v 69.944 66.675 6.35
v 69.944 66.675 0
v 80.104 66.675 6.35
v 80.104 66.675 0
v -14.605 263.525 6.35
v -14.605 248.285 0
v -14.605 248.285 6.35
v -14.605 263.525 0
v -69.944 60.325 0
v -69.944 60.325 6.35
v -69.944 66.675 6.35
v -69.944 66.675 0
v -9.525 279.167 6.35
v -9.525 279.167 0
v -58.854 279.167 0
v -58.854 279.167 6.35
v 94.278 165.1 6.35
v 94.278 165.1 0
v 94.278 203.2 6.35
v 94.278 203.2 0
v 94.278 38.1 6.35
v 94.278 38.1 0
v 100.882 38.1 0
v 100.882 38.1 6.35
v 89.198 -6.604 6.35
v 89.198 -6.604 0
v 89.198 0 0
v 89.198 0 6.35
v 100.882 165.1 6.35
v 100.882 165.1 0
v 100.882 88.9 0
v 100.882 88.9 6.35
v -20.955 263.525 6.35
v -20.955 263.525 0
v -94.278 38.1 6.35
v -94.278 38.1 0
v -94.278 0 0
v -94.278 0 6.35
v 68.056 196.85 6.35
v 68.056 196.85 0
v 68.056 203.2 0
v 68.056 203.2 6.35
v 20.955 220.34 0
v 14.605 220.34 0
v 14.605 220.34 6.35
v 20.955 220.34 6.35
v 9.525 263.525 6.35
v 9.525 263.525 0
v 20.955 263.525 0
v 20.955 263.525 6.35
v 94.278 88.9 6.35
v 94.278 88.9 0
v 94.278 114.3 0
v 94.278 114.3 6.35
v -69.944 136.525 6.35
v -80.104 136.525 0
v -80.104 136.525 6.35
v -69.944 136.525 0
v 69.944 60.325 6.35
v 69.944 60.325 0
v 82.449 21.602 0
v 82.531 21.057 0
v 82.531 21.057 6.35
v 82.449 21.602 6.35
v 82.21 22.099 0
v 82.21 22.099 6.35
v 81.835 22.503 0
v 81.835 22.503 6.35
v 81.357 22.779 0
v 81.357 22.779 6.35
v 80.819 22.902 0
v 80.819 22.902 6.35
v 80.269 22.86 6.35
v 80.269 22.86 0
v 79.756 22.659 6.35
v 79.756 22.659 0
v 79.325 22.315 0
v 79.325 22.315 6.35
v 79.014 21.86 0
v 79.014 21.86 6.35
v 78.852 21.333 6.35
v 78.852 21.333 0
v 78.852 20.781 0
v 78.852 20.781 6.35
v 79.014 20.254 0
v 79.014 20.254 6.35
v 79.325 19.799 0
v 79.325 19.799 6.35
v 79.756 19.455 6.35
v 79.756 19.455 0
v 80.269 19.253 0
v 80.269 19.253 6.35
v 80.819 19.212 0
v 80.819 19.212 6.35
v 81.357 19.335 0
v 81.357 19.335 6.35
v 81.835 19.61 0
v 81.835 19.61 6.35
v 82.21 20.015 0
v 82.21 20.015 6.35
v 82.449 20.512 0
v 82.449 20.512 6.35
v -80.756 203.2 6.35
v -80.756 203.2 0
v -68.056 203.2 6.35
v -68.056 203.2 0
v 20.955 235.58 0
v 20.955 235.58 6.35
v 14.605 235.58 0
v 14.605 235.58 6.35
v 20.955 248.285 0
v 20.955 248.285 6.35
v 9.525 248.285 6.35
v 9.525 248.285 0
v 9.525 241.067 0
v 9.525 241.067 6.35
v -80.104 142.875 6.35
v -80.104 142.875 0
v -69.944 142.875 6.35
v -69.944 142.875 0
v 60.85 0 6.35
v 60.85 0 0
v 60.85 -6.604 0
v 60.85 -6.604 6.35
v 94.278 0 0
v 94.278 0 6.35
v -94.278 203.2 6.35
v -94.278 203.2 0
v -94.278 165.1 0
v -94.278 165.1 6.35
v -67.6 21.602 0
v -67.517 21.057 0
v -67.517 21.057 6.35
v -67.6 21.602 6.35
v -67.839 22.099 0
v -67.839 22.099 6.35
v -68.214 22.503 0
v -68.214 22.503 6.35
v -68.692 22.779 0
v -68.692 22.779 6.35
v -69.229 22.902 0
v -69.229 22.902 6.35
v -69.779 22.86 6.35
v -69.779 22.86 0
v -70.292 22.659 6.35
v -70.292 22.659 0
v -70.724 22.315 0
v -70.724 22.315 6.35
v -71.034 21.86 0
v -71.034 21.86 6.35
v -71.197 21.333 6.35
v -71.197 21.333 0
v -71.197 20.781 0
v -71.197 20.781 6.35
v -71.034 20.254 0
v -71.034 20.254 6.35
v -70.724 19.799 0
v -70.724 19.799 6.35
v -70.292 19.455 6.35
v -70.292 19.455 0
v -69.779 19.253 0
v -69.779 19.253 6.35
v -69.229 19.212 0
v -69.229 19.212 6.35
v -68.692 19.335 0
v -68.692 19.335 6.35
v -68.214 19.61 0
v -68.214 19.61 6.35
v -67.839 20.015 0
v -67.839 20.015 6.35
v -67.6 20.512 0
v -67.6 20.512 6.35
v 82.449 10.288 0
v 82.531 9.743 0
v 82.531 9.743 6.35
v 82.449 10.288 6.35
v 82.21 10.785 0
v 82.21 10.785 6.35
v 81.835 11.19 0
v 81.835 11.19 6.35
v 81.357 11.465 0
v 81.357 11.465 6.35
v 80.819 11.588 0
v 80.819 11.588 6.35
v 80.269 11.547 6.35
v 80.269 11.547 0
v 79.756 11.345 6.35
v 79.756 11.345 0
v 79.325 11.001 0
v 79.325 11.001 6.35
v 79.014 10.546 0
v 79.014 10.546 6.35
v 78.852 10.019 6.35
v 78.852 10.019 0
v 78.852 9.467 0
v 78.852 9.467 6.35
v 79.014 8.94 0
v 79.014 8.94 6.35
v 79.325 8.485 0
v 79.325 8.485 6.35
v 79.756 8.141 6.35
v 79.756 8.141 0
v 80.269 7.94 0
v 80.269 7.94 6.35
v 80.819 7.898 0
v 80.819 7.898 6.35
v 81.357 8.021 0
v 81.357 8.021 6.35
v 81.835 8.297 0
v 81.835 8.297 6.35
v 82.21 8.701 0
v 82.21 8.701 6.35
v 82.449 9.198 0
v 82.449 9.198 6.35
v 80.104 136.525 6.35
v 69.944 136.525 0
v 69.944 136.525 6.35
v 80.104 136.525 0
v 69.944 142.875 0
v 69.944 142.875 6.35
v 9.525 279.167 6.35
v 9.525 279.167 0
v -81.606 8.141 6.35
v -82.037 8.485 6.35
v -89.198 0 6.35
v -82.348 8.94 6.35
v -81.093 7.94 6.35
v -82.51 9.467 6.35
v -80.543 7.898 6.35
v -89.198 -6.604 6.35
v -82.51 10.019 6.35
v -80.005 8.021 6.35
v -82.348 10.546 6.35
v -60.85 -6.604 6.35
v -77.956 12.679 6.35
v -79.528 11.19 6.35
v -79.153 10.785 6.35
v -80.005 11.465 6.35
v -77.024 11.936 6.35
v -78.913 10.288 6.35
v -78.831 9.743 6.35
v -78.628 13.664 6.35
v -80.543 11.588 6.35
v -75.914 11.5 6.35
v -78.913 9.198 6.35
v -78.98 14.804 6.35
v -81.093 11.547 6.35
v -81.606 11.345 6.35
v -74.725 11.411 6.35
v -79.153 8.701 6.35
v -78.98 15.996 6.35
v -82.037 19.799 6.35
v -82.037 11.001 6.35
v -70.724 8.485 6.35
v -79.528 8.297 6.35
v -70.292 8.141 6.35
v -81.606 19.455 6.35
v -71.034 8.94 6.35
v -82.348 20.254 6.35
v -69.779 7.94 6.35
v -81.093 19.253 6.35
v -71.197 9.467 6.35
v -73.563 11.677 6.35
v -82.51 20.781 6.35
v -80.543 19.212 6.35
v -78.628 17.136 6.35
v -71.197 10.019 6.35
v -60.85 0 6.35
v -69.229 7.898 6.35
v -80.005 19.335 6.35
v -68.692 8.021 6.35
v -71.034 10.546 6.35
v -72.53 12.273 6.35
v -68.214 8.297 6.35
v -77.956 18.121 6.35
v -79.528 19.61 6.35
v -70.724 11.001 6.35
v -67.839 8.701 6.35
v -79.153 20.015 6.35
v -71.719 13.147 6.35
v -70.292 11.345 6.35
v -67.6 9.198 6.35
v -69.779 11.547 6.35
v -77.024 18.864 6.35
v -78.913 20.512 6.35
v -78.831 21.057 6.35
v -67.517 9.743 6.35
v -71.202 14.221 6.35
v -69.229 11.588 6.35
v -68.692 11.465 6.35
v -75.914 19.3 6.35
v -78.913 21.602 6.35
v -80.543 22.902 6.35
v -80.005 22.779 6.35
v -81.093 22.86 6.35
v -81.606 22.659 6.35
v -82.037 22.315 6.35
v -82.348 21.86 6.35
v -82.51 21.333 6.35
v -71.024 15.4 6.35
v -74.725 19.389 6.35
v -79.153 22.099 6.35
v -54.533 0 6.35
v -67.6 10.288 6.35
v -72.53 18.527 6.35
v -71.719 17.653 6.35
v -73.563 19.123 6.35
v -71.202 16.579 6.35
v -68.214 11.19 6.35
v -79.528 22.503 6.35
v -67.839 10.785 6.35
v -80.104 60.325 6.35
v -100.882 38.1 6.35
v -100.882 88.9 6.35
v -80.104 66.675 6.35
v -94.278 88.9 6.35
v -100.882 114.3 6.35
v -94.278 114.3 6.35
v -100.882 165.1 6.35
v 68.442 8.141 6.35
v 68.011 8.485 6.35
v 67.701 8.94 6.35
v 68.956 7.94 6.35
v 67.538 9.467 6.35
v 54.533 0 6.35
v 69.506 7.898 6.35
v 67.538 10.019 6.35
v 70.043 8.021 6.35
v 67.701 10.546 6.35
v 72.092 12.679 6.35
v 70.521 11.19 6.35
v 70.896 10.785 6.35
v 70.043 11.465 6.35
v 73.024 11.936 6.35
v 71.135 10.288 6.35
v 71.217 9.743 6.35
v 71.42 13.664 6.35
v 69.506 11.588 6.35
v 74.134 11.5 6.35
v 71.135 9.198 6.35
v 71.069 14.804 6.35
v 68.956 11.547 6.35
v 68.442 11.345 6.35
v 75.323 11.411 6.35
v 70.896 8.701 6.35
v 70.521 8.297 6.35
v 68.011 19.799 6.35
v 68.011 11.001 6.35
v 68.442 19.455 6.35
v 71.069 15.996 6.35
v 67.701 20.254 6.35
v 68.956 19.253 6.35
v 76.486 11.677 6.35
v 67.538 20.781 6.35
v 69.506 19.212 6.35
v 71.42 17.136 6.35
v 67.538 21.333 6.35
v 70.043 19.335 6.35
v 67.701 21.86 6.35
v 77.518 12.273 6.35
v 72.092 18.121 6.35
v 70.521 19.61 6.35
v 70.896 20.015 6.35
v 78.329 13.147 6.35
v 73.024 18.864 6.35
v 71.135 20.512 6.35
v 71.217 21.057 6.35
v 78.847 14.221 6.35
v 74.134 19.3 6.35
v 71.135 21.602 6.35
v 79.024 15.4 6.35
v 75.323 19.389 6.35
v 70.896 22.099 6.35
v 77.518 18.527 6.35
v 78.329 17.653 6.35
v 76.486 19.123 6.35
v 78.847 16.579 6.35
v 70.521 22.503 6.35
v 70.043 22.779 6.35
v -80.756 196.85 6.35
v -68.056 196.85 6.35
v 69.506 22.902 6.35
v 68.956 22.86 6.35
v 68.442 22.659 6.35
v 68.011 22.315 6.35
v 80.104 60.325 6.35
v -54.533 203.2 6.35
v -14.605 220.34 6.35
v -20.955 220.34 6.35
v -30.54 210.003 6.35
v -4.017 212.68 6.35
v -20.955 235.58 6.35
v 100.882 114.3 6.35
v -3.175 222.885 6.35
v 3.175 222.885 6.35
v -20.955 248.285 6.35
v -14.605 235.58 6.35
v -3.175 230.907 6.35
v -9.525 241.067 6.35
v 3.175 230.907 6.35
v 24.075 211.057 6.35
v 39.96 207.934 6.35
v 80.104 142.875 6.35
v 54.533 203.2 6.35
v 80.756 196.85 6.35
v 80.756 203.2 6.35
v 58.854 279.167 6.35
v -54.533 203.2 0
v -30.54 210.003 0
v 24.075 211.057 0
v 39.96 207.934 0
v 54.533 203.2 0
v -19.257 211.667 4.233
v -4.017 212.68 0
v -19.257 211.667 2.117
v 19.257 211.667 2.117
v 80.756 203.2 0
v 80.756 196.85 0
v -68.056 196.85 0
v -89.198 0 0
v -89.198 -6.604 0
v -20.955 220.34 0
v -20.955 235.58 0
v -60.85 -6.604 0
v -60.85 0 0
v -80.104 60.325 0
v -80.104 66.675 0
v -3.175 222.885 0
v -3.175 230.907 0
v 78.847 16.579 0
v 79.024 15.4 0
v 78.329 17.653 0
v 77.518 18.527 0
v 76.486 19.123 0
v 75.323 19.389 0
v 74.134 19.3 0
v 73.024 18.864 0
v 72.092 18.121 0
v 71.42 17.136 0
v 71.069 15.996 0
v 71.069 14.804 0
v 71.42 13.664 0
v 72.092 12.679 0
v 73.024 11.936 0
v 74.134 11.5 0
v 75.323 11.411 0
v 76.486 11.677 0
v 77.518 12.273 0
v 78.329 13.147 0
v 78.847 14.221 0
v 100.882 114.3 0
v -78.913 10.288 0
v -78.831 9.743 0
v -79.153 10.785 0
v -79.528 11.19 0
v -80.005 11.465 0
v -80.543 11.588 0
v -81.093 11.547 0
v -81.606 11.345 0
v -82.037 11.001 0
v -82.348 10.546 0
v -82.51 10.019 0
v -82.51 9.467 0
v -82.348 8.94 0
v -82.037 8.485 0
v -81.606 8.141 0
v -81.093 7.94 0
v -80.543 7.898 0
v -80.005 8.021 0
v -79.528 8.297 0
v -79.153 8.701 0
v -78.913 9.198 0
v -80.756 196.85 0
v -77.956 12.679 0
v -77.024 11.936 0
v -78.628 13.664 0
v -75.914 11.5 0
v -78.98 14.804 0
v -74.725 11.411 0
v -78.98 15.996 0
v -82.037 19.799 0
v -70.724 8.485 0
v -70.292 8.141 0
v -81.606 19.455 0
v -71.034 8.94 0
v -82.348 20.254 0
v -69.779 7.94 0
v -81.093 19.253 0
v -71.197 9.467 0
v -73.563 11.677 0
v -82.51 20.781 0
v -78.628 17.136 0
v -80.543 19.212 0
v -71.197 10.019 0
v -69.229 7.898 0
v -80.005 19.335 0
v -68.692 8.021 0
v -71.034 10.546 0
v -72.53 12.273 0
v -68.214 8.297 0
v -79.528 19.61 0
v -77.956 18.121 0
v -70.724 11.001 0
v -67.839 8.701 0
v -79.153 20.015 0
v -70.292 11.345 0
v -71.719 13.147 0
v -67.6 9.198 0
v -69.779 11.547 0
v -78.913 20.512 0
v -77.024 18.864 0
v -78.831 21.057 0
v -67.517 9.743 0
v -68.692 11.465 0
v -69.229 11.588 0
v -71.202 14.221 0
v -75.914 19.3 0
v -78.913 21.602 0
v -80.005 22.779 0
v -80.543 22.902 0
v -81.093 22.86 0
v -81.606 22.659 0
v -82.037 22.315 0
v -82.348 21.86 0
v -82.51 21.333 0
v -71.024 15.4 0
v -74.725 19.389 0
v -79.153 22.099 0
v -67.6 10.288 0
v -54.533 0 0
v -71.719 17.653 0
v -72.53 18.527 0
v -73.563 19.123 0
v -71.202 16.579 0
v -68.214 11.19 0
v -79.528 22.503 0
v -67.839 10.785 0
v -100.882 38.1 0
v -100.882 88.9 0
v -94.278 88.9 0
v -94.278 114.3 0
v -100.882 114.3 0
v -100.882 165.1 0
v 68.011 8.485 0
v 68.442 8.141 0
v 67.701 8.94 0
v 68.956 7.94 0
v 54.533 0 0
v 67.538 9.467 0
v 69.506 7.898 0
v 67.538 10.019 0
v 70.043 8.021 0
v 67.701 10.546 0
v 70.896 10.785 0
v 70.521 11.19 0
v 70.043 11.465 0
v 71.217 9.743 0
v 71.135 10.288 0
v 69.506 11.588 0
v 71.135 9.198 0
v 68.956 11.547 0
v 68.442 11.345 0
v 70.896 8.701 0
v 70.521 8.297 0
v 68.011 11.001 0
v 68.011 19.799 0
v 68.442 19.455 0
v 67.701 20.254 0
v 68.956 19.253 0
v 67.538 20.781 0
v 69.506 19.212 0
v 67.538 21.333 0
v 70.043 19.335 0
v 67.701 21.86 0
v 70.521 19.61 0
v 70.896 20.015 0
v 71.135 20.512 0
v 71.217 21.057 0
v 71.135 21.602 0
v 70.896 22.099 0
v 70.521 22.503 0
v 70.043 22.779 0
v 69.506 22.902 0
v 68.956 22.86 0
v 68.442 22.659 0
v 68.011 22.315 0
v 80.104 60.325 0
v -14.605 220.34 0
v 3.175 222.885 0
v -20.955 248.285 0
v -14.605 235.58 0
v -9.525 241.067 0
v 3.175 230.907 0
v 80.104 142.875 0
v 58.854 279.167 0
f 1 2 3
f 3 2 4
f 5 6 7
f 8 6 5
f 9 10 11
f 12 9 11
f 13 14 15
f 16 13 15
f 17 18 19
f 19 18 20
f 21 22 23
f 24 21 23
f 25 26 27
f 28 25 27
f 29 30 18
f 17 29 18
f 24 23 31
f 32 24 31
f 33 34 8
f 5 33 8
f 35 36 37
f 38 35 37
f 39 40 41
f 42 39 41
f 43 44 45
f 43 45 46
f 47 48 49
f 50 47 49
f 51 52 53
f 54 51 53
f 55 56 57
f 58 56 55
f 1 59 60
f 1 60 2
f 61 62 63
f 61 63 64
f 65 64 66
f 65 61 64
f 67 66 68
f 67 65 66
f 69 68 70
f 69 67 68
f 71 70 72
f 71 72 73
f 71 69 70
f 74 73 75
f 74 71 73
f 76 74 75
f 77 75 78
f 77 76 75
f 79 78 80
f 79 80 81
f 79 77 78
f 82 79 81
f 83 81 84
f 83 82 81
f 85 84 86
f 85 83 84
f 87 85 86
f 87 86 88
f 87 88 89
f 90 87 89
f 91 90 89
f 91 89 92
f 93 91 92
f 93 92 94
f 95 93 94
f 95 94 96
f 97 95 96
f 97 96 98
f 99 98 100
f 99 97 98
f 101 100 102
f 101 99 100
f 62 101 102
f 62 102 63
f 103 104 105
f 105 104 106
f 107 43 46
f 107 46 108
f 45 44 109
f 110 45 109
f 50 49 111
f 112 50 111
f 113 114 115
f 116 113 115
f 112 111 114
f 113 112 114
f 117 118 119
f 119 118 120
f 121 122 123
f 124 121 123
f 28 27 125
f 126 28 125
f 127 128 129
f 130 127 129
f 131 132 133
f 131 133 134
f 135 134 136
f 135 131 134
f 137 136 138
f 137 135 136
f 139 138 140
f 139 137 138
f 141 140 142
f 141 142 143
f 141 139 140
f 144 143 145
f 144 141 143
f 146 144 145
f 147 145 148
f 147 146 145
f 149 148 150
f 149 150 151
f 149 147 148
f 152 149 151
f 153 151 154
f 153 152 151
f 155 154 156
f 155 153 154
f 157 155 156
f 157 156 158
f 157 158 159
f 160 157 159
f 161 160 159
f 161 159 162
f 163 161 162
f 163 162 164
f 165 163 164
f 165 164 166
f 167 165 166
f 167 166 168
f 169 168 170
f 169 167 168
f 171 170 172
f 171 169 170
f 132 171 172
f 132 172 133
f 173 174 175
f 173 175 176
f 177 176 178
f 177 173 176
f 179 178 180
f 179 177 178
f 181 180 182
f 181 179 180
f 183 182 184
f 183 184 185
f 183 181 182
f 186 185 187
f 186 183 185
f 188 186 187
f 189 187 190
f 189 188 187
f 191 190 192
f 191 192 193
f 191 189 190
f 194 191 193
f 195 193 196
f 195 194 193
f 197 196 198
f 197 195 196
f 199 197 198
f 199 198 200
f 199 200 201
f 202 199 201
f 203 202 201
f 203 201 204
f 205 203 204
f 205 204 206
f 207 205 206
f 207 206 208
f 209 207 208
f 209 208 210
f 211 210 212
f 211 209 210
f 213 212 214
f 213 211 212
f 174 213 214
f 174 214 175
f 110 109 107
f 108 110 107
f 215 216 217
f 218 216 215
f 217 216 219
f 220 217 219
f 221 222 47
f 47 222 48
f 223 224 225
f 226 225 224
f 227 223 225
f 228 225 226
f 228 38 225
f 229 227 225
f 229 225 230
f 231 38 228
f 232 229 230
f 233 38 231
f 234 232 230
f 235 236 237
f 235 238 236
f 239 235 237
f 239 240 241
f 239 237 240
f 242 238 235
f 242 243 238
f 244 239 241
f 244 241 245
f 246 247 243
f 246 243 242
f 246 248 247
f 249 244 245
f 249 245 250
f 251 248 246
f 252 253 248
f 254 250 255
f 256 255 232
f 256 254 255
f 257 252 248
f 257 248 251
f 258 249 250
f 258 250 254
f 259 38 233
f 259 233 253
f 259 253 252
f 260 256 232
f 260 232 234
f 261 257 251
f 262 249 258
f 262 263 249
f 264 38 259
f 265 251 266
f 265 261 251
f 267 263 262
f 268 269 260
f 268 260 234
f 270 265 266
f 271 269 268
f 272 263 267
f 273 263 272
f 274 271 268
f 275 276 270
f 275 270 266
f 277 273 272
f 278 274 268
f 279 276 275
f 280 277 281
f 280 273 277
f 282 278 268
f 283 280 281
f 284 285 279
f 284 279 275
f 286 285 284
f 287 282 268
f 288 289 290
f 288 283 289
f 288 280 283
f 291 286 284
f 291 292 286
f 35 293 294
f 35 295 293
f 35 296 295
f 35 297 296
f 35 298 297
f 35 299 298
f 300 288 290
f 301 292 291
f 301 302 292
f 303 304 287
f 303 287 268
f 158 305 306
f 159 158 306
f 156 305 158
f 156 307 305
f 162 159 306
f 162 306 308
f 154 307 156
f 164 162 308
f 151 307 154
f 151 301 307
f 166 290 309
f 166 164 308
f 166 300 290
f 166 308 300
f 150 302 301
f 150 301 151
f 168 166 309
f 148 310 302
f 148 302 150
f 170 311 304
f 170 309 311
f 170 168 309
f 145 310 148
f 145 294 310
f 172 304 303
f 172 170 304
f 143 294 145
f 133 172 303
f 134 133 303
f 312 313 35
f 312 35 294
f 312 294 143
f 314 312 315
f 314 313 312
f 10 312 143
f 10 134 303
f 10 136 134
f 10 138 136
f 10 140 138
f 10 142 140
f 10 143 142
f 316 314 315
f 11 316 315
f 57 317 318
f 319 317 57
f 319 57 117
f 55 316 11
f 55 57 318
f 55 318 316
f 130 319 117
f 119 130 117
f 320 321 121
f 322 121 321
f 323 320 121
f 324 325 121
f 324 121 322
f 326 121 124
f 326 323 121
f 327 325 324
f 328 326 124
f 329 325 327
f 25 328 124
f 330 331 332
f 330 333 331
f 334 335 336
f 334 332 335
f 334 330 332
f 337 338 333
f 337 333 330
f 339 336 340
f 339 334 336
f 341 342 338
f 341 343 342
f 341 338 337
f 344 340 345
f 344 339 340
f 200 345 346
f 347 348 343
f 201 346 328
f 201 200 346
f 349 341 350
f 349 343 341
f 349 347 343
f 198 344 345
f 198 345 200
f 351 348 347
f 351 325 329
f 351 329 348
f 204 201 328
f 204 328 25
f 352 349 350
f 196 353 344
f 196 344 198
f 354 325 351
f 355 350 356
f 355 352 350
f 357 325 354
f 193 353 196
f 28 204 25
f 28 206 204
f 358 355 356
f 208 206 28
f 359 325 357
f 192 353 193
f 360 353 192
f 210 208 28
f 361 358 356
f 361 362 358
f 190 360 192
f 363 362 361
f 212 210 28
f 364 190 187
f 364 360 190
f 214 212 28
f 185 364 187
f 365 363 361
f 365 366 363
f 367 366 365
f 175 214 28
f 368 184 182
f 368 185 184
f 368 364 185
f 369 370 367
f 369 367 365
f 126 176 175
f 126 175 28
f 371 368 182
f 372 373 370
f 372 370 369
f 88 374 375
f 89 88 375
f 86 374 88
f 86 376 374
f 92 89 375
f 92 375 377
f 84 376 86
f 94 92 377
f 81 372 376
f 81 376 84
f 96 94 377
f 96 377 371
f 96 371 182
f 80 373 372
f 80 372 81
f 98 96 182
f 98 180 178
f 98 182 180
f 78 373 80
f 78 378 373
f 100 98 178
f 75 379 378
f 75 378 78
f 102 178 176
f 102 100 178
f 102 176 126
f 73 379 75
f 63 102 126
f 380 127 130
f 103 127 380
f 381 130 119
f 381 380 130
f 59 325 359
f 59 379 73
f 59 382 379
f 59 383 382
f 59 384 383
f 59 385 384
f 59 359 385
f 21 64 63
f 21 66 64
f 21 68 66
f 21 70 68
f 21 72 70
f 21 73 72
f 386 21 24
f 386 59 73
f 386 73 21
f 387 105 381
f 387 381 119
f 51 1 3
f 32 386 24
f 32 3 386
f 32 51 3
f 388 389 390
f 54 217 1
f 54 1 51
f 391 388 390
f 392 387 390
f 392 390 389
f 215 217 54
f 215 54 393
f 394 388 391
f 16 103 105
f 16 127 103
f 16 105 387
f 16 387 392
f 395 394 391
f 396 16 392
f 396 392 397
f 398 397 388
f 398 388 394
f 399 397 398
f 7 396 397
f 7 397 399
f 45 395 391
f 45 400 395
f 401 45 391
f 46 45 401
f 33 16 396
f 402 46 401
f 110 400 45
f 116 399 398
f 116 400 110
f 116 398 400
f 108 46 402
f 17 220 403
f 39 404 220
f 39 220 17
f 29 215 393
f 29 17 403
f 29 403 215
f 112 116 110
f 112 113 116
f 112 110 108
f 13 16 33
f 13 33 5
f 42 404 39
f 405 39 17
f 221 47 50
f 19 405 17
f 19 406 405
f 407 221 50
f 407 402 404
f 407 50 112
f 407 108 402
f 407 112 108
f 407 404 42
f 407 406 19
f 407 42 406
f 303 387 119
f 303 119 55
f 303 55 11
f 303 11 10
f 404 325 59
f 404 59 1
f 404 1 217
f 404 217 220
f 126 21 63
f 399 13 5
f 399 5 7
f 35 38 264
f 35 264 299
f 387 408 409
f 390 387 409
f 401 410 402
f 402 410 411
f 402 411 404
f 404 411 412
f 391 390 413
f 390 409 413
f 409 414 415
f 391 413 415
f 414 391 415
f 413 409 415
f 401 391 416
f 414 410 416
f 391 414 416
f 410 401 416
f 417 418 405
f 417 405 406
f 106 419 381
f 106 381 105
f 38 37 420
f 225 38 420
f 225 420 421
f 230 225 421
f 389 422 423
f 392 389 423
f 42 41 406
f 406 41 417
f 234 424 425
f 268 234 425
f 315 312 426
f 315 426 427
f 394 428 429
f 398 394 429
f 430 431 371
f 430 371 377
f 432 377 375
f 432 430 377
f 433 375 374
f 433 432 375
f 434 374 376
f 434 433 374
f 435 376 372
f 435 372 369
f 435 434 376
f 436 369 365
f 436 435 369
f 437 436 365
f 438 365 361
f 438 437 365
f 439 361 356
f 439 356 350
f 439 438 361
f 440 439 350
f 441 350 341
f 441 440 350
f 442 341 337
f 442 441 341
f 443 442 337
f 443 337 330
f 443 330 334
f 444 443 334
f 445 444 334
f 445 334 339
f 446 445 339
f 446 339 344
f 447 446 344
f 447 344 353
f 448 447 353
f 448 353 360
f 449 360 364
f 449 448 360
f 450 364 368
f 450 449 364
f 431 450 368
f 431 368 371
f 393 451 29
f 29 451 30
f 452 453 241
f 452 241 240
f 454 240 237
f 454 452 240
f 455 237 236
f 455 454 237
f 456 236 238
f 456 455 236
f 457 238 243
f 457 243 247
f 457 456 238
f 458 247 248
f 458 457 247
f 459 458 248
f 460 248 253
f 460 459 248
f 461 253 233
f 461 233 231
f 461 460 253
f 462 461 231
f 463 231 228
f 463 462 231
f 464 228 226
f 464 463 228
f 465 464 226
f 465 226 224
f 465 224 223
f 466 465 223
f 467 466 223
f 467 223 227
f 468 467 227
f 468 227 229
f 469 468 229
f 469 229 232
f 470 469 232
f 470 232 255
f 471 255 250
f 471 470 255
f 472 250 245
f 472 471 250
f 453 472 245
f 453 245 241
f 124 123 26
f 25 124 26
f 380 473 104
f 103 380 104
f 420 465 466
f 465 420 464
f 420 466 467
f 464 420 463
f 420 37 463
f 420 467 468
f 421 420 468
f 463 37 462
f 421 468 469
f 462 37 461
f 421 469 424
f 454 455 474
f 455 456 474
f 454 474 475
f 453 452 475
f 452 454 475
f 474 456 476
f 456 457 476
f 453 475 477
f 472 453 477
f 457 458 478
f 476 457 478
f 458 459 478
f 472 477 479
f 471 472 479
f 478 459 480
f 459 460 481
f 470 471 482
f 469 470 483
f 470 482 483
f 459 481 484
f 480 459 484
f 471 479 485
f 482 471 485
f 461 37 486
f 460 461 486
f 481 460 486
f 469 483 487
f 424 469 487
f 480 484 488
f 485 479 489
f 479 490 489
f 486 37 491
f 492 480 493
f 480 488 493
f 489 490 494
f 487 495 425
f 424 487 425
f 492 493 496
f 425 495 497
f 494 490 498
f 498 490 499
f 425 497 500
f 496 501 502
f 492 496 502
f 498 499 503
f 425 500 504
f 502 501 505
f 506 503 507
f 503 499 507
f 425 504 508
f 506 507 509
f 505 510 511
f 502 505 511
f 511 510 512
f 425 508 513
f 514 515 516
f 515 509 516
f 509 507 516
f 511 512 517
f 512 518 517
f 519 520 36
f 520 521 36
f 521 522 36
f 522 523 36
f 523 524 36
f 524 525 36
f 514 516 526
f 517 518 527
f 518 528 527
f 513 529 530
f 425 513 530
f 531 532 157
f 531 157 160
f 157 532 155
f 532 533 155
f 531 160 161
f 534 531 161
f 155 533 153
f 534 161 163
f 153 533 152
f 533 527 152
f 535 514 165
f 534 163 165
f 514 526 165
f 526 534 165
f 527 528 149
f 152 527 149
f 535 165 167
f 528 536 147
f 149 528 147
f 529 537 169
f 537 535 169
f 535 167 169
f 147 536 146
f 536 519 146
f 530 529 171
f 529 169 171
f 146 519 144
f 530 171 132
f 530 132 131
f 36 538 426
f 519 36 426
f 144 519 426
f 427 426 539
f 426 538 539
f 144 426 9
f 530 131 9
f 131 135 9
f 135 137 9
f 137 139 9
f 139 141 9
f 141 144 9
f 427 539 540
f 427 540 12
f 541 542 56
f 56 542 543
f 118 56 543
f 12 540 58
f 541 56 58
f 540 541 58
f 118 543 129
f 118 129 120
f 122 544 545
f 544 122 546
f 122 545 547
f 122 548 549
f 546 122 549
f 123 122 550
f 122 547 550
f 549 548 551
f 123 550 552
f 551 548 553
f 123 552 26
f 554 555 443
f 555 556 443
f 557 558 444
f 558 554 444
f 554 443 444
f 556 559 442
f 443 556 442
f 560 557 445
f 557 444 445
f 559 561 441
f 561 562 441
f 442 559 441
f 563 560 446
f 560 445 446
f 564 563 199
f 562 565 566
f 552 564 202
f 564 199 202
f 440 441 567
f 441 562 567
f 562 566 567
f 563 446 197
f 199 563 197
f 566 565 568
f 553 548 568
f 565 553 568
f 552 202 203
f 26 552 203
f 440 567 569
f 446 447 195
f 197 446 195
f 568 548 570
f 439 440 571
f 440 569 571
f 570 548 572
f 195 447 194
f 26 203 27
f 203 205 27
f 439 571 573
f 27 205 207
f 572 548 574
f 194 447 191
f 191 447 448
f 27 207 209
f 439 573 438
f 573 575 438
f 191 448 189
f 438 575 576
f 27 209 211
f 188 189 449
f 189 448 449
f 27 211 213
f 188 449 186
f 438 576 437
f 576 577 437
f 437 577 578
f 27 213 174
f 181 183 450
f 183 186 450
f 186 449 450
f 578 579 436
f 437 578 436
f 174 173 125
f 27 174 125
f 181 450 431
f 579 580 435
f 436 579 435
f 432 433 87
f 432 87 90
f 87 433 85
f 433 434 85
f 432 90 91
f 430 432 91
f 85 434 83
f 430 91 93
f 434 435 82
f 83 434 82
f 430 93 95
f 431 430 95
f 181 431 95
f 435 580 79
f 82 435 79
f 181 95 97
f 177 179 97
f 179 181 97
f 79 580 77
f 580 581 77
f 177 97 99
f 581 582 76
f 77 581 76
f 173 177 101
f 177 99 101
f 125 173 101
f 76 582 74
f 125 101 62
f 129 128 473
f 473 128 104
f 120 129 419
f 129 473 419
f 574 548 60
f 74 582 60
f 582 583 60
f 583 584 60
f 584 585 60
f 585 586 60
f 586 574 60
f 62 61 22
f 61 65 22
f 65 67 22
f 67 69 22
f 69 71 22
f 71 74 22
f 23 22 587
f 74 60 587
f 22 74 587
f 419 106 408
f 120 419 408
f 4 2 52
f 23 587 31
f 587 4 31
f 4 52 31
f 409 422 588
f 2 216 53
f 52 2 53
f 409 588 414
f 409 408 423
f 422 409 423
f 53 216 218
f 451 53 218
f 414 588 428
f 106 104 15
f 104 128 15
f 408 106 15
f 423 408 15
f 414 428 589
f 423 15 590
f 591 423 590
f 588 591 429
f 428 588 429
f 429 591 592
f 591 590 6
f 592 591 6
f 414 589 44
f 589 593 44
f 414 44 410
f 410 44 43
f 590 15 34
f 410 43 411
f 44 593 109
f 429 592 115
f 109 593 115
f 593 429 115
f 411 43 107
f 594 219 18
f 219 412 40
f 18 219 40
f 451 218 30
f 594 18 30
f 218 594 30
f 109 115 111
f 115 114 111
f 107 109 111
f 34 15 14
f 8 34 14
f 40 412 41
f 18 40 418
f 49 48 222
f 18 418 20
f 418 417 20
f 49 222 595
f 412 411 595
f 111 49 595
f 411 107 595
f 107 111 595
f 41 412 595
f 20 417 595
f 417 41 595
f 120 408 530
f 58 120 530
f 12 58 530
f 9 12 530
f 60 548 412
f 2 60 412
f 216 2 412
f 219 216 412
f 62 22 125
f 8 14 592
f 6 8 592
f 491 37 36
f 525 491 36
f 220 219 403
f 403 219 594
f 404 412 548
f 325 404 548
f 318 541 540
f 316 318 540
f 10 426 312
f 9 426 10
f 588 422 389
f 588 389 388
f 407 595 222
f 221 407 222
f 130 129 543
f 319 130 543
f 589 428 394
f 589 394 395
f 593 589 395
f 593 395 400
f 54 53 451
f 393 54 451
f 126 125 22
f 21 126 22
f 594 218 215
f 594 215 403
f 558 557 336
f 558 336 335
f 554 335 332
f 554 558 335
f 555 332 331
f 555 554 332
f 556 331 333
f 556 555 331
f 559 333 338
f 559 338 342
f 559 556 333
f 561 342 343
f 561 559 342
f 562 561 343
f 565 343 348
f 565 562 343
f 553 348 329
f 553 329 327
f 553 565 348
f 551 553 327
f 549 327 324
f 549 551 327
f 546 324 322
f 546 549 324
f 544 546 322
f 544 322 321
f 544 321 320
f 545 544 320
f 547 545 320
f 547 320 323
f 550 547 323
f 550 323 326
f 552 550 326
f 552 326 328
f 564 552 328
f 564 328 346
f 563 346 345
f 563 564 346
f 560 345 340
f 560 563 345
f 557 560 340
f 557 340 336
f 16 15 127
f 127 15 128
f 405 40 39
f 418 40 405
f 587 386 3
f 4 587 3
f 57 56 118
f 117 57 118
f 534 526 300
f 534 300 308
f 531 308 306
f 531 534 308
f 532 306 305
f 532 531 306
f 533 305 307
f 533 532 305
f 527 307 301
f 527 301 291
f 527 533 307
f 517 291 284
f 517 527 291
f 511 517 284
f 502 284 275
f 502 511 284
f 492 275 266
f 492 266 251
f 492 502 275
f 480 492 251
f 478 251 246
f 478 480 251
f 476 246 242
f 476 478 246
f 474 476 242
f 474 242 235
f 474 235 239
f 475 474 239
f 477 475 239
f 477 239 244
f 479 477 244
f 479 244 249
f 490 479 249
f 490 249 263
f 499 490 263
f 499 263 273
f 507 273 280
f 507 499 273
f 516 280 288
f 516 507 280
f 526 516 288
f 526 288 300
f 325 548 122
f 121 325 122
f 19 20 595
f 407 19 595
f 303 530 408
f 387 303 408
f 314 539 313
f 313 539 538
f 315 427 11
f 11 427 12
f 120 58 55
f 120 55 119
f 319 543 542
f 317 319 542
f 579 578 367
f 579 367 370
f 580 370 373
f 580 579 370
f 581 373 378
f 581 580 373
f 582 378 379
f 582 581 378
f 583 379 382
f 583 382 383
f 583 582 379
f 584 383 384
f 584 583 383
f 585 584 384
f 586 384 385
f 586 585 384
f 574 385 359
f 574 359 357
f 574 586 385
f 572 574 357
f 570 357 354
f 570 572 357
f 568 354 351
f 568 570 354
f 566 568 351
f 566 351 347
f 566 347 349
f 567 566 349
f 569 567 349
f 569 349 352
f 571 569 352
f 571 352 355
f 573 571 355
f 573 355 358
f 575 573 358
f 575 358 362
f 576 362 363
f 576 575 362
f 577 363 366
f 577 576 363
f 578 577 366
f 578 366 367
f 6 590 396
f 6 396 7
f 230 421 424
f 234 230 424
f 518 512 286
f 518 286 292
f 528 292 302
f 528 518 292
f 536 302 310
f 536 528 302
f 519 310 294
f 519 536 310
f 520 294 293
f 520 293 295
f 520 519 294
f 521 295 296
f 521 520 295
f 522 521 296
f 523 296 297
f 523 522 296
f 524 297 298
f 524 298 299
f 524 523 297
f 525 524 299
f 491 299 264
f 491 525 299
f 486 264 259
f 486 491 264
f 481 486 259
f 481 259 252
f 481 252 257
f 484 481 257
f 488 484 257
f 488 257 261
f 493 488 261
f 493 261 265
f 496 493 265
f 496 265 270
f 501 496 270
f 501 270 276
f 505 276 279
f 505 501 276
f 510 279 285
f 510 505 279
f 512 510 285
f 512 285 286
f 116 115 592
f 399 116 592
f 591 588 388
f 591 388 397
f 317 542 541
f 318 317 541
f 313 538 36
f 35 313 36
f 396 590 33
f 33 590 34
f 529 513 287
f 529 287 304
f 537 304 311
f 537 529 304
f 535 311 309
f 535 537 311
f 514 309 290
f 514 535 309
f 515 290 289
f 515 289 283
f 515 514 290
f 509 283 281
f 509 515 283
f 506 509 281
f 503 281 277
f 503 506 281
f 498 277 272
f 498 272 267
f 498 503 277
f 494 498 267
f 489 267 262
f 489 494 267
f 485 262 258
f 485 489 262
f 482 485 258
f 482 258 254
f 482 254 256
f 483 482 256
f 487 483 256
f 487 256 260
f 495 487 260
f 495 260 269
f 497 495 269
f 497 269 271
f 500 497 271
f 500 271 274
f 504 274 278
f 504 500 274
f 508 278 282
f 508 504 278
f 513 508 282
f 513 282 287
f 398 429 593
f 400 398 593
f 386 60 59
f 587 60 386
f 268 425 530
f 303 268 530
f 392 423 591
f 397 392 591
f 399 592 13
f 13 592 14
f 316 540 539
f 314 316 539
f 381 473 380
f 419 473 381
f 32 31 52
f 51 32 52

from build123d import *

# Parameters (mm, degrees)
F0_R     = 1.85
F0_R_2   = 4
F0_W     = 10.16
F0_H     = 6.35
F0_W_2   = 12.7
F0_W_3   = 6.35
F0_H_2   = 15.24
F0_H_3   = 8.021719
F1_DEPTH = 6.35


with BuildPart() as f1:
    # F0 (on Top) → F1 (new body)
    with BuildSketch(Plane.XY):
        with BuildLine():
            Line((-60.850162, -6.604), (-60.850162, 0))
            Line((-60.850162, 0), (-54.533258, 0))
            Line((-54.533258, 0), (-54.533258, 203.2))
            add(Edge.make_bspline(
                [(-54.533258, 203.2), (-23.033295, 215.9), (23.033295, 215.9), (54.533258, 203.2)],
                knots=[0, 0, 0, 0, 109.066515, 109.066515, 109.066515, 109.066515], degree=3))
            Line((54.533258, 203.2), (54.533258, 0))
            Line((54.533258, 0), (60.850162, 0))
            Line((60.850162, 0), (60.850162, -6.604))
            Line((60.850162, -6.604), (89.198314, -6.604))
            Line((89.198314, -6.604), (89.198314, 0))
            Line((89.198314, 0), (94.278314, 0))
            Line((94.278314, 0), (94.278314, 38.1))
            Line((94.278314, 38.1), (100.882314, 38.1))
            Line((100.882314, 38.1), (100.882314, 88.9))
            Line((100.882314, 88.9), (94.278314, 88.9))
            Line((94.278314, 88.9), (94.278314, 114.3))
            Line((94.278314, 114.3), (100.882314, 114.3))
            Line((100.882314, 114.3), (100.882314, 165.1))
            Line((100.882314, 165.1), (94.278314, 165.1))
            Line((94.278314, 165.1), (94.278314, 203.2))
            Line((94.278314, 203.2), (58.854451, 279.166719))
            Line((58.854451, 279.166719), (9.525, 279.166719))
            Line((9.525, 279.166719), (9.525, 263.525))
            Line((9.525, 263.525), (20.955, 263.525))
            Line((20.955, 263.525), (20.955, 248.285))
            Line((20.955, 248.285), (9.525, 248.285))
            Line((9.525, 248.285), (9.525, 241.066719))
            Line((9.525, 241.066719), (-9.525, 241.066719))
            Line((-9.525, 241.066719), (-9.525, 279.166719))
            Line((-9.525, 279.166719), (-58.854451, 279.166719))
            Line((-58.854451, 279.166719), (-94.278314, 203.2))
            Line((-94.278314, 203.2), (-94.278314, 165.1))
            Line((-94.278314, 165.1), (-100.882314, 165.1))
            Line((-100.882314, 165.1), (-100.882314, 114.3))
            Line((-100.882314, 114.3), (-94.278314, 114.3))
            Line((-94.278314, 114.3), (-94.278314, 88.9))
            Line((-94.278314, 88.9), (-100.882314, 88.9))
            Line((-100.882314, 88.9), (-100.882314, 38.1))
            Line((-100.882314, 38.1), (-94.278314, 38.1))
            Line((-94.278314, 38.1), (-94.278314, 0))
            Line((-94.278314, 0), (-89.198314, 0))
            Line((-89.198314, 0), (-89.198314, -6.604))
            Line((-89.198314, -6.604), (-60.850162, -6.604))
        make_face()
        with Locations((-80.681092, 9.743146)):
            Circle(F0_R, mode=Mode.SUBTRACT)
        with Locations((-80.681092, 21.056854)):
            Circle(F0_R, mode=Mode.SUBTRACT)
        with Locations((-69.367384, 9.743146)):
            Circle(F0_R, mode=Mode.SUBTRACT)
        with Locations((-75.024238, 15.4)):
            Circle(F0_R_2, mode=Mode.SUBTRACT)
        with Locations((-69.367384, 21.056854)):
            Circle(F0_R, mode=Mode.SUBTRACT)
        with Locations((-75.024238, 63.5)):
            Rectangle(F0_W, F0_H, mode=Mode.SUBTRACT)
        with Locations((69.367384, 9.743146)):
            Circle(F0_R, mode=Mode.SUBTRACT)
        with Locations((75.024238, 15.4)):
            Circle(F0_R_2, mode=Mode.SUBTRACT)
        with Locations((69.367384, 21.056854)):
            Circle(F0_R, mode=Mode.SUBTRACT)
        with Locations((80.681092, 9.743146)):
            Circle(F0_R, mode=Mode.SUBTRACT)
        with Locations((80.681092, 21.056854)):
            Circle(F0_R, mode=Mode.SUBTRACT)
        with Locations((75.024238, 63.5)):
            Rectangle(F0_W, F0_H, mode=Mode.SUBTRACT)
        with Locations((-75.024238, 139.7)):
            Rectangle(F0_W, F0_H, mode=Mode.SUBTRACT)
        with Locations((-74.405786, 200.025)):
            Rectangle(F0_W_2, F0_H, mode=Mode.SUBTRACT)
        with Locations((-17.78, 227.960319)):
            Rectangle(F0_W_3, F0_H_2, mode=Mode.SUBTRACT)
        with Locations((-17.78, 255.905)):
            Rectangle(F0_W_3, F0_H_2, mode=Mode.SUBTRACT)
        with Locations((75.024238, 139.7)):
            Rectangle(F0_W, F0_H, mode=Mode.SUBTRACT)
        with Locations((74.405786, 200.025)):
            Rectangle(F0_W_2, F0_H, mode=Mode.SUBTRACT)
        with Locations((0, 226.895859)):
            Rectangle(F0_W_3, F0_H_3, mode=Mode.SUBTRACT)
        with Locations((17.78, 227.960319)):
            Rectangle(F0_W_3, F0_H_2, mode=Mode.SUBTRACT)
    extrude(amount=F1_DEPTH)


solid = f1.part
